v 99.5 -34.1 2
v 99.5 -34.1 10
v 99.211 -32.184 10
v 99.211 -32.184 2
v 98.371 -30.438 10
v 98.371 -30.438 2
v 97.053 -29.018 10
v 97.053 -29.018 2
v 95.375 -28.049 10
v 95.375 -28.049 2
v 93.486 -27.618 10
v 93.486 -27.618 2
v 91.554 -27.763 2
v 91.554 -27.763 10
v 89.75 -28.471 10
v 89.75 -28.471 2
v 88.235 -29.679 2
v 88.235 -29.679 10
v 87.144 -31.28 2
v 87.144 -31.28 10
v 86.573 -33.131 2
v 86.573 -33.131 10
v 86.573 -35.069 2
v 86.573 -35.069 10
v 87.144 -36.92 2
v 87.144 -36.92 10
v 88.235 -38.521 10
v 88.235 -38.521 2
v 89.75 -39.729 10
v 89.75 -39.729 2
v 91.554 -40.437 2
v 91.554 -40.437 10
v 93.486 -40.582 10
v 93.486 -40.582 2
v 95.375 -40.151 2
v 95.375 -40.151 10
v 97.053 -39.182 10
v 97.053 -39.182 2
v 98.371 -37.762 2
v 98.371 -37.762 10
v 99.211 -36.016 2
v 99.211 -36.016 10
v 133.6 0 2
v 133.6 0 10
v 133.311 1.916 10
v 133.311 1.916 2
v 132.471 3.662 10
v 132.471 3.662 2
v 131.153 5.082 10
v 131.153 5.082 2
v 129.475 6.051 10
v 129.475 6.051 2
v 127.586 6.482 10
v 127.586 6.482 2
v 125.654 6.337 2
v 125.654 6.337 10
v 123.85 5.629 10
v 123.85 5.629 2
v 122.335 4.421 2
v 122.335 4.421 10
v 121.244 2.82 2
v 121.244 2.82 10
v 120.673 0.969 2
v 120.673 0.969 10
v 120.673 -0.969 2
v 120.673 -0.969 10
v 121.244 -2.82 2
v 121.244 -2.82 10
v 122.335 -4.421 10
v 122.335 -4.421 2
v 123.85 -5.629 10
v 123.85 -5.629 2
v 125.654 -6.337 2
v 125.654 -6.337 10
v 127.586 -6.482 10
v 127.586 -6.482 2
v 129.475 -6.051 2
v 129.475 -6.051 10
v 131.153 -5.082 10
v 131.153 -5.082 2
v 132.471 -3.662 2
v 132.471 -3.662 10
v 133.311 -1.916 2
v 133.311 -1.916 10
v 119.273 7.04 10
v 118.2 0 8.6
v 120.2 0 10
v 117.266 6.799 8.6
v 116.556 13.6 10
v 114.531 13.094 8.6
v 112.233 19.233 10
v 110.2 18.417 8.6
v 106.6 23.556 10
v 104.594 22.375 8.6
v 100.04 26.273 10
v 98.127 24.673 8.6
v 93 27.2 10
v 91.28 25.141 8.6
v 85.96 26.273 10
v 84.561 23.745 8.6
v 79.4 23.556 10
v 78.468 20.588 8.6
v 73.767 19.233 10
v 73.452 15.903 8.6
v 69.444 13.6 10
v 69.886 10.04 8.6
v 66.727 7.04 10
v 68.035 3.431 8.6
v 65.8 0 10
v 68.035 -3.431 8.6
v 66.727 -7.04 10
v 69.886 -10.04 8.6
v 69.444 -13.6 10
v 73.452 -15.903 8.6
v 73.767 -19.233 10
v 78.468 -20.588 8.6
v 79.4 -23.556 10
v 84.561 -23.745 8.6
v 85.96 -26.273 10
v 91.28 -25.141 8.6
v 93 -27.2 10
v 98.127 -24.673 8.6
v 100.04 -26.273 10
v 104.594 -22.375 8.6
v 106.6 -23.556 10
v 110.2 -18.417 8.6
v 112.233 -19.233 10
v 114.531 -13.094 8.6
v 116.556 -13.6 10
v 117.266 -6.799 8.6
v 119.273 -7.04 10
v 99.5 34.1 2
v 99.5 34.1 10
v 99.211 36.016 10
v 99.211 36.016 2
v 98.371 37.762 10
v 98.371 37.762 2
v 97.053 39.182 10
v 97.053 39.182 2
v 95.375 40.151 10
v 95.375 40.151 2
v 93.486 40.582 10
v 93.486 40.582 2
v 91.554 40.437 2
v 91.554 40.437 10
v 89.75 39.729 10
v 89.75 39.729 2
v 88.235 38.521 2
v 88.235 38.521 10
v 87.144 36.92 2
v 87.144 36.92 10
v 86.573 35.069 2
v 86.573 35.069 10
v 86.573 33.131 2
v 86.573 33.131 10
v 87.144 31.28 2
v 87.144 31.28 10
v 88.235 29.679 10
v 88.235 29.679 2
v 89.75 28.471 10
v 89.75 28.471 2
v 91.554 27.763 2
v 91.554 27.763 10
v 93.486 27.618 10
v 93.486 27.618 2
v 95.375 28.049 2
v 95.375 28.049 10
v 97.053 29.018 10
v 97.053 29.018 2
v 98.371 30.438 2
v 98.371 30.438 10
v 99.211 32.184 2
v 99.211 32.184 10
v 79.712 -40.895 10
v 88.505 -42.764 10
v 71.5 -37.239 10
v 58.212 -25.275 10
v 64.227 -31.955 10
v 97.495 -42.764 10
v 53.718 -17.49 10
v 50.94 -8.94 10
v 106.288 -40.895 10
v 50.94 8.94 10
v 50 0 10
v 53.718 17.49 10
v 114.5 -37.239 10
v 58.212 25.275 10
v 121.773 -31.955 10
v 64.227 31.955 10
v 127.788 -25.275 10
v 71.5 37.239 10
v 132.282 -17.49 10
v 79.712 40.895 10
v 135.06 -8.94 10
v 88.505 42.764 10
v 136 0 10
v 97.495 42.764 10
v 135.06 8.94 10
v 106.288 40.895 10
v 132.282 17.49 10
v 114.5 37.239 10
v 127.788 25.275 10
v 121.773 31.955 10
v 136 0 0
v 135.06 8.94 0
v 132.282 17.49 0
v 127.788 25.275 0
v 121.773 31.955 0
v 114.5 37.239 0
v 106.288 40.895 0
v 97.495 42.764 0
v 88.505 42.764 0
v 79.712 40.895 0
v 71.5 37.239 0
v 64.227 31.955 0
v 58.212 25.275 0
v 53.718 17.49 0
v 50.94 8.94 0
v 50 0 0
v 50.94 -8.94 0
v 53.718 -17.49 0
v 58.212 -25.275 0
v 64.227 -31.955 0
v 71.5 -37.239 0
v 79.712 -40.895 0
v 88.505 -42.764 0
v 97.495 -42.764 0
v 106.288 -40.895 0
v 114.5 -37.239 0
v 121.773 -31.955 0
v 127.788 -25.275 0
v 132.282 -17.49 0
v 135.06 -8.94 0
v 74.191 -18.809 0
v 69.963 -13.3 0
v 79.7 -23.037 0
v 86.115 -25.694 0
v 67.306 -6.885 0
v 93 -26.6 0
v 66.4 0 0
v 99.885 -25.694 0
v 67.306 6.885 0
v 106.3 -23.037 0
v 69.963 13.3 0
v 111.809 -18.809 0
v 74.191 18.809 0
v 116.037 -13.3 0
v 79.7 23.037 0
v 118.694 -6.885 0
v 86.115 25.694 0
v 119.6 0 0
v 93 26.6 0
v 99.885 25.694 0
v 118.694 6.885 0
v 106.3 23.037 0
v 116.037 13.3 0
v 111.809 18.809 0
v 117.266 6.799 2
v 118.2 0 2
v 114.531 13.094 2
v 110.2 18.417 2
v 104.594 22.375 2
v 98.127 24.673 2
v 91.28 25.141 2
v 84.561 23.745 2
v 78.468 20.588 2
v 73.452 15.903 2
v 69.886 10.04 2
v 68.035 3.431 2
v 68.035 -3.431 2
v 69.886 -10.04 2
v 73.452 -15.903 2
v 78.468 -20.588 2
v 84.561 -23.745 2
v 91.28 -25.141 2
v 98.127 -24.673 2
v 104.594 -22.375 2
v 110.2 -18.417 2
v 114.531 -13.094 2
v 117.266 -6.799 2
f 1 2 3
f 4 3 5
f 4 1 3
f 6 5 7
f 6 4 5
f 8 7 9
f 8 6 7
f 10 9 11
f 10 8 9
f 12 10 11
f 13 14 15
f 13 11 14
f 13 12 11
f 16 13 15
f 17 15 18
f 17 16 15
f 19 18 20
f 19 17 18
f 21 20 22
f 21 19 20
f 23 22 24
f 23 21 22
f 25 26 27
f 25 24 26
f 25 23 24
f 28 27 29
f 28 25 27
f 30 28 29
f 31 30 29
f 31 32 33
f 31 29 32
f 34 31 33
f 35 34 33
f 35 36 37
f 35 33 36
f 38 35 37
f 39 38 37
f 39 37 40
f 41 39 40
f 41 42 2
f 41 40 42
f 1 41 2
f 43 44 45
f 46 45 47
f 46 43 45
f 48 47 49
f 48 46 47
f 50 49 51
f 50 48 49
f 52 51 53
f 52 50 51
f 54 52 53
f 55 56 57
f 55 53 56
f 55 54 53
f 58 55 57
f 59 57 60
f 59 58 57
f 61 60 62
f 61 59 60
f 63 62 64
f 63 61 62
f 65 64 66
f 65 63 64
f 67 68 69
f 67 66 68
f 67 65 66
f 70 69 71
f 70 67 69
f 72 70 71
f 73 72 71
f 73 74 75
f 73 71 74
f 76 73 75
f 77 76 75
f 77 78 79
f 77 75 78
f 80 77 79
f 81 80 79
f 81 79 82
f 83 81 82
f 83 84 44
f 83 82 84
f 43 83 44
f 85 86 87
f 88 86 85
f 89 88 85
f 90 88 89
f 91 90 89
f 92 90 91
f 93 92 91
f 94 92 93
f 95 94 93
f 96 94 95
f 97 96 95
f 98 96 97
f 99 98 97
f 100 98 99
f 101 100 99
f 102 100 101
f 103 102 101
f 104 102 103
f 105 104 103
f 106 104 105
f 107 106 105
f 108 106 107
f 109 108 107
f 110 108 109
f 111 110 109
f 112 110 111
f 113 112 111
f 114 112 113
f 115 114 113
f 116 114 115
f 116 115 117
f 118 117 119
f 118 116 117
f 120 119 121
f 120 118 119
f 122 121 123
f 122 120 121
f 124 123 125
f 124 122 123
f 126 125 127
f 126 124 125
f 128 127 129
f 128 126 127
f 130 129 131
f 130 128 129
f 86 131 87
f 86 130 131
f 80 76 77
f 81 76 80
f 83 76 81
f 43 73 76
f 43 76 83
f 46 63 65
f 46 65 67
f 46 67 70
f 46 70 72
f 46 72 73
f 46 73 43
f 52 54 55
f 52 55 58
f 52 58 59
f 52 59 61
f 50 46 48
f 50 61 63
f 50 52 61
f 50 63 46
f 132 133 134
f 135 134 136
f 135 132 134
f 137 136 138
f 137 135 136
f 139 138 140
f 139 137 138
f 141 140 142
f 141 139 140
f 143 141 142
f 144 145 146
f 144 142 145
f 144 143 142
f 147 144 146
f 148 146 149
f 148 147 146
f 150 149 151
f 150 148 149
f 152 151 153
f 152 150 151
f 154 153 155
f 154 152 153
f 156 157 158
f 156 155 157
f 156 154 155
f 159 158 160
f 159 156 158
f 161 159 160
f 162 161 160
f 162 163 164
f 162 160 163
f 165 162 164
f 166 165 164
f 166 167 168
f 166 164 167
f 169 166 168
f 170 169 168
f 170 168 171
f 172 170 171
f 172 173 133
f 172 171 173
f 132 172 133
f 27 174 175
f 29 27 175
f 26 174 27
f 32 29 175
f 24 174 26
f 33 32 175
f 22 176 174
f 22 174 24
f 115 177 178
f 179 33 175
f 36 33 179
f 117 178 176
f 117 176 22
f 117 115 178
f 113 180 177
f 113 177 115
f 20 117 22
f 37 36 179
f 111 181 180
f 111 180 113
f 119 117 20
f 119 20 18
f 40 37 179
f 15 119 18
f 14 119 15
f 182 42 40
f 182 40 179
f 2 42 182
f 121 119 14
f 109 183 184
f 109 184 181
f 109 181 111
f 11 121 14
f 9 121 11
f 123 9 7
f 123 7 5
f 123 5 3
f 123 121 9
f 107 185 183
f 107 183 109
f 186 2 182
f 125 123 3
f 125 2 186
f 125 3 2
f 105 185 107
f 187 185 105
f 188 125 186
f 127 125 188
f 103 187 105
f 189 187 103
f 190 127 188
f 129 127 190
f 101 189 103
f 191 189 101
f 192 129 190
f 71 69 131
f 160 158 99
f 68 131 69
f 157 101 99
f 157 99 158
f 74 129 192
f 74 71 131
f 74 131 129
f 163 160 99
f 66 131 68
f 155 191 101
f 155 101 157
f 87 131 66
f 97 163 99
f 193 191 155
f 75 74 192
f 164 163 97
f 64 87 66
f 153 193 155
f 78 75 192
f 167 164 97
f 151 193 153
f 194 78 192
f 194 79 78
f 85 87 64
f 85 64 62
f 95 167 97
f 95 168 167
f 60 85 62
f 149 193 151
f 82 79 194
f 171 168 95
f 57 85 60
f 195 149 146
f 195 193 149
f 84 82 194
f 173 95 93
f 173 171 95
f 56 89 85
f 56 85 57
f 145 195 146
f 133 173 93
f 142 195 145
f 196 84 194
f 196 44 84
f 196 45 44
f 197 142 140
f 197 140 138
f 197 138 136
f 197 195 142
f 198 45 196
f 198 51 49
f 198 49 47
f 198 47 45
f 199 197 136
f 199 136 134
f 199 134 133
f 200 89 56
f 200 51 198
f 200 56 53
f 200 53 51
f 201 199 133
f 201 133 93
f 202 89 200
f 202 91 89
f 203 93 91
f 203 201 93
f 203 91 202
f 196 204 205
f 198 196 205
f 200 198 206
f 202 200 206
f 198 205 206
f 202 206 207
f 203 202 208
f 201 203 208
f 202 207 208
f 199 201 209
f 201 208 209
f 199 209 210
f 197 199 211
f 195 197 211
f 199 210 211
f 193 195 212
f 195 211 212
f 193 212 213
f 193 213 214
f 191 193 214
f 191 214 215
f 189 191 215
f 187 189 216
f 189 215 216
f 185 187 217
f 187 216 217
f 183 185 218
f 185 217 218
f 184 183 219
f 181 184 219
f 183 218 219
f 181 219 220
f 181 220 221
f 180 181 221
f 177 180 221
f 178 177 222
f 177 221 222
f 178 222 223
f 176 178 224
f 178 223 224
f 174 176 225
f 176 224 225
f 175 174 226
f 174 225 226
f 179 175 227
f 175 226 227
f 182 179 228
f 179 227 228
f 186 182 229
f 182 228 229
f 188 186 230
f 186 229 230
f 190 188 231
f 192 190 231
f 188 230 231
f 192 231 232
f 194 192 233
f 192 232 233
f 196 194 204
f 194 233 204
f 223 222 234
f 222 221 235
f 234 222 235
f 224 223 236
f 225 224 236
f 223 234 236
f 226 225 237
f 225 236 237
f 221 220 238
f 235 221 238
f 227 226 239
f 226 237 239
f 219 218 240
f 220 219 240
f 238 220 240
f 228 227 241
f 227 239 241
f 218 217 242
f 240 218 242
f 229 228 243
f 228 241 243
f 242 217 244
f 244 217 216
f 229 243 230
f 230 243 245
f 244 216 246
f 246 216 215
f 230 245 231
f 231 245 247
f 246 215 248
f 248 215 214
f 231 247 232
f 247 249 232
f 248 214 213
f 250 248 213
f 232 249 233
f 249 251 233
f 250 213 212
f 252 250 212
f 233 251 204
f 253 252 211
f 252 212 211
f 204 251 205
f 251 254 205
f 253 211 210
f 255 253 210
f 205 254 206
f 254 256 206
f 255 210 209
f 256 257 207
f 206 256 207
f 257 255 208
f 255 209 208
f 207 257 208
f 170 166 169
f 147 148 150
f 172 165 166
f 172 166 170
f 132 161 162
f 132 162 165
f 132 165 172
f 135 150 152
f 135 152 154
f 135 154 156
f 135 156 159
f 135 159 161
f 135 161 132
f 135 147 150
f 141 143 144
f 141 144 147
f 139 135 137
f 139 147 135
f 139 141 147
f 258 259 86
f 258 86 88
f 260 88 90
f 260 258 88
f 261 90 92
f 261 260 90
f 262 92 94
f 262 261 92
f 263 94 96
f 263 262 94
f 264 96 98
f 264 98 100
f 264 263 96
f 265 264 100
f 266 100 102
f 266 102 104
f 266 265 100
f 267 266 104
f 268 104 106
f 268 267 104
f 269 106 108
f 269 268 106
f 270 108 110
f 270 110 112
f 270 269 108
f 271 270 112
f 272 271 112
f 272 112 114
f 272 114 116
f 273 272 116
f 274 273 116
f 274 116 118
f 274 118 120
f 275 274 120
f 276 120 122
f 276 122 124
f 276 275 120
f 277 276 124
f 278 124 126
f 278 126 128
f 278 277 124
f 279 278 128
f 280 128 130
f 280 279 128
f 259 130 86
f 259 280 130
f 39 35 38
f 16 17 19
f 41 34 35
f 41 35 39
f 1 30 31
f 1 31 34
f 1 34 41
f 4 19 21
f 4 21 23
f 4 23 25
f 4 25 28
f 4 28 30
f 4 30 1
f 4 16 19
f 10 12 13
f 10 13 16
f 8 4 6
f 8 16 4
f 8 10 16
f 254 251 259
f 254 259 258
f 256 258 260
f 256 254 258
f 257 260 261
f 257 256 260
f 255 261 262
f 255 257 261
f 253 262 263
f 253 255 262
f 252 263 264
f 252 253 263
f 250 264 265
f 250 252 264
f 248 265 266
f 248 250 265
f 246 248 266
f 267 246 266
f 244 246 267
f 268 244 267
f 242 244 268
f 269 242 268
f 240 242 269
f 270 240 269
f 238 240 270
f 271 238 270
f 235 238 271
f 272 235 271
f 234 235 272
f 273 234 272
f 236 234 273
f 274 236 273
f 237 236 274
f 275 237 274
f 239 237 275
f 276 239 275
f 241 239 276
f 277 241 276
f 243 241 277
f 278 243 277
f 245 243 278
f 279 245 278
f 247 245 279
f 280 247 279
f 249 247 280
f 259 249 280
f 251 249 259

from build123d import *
from OCP.BRepFilletAPI import BRepFilletAPI_MakeChamfer

# Parameters (mm, degrees)
SKETCH1_R           = 43
SKETCH1_R_2         = 25.2
BOSS_EXTRUDE1_DEPTH = 10
SKETCH2_R           = 6.5
CUT_EXTRUDE1_DEPTH  = 143.860071399
CHAMFER1_SIZE       = 2
CHAMFER1_SIZE2      = 1.400415076


with BuildPart() as part:
    # Sketch1 → Boss-Extrude1 (new body)
    with BuildSketch(Plane.XY):
        with Locations((93, 0)):
            Circle(SKETCH1_R)
        with Locations((93, 0)):
            Circle(SKETCH1_R_2, mode=Mode.SUBTRACT)
    extrude(amount=BOSS_EXTRUDE1_DEPTH)

    # Sketch2 → Cut-Extrude1 (cut, through all)
    with BuildSketch(Plane.XY.offset(2)):
        with Locations((93, 34.1)):
            Circle(SKETCH2_R)
        with Locations((127.1, 0)):
            Circle(SKETCH2_R)
        with Locations((93, -34.1)):
            Circle(SKETCH2_R)
    extrude(amount=CUT_EXTRUDE1_DEPTH, mode=Mode.SUBTRACT)

    # Chamfer1: one chamfer whose edges measure the first distance from different faces: ONE call of the kernel's chamfer builder (chamfer() names one face for all edges)
    chamfer1_edges_1 = [part.edges().sort_by_distance(p)[0] for p in [
        (67.8, 0, 0),
    ]]
    chamfer1_side_1 = [part.faces().sort_by_distance(p)[0] for p in [
        (67.8, 0, 5),
    ]]
    chamfer1_edges_2 = [part.edges().sort_by_distance(p)[0] for p in [
        (67.8, 0, 10),
    ]]
    chamfer1_side_2 = [part.faces().sort_by_distance(p)[0] for p in [
        (51.216223664, 0, 10),
    ]]
    chamfer1 = BRepFilletAPI_MakeChamfer(part.part.solid().wrapped)
    for e in chamfer1_edges_1:
        chamfer1.Add(CHAMFER1_SIZE, CHAMFER1_SIZE2, e.wrapped, chamfer1_side_1[0].wrapped)  # the first distance lies on this face
    for e in chamfer1_edges_2:
        chamfer1.Add(CHAMFER1_SIZE, CHAMFER1_SIZE2, e.wrapped, chamfer1_side_2[0].wrapped)  # the first distance lies on this face
    add(Compound.cast(chamfer1.Shape()), mode=Mode.REPLACE)


solid = part.part
